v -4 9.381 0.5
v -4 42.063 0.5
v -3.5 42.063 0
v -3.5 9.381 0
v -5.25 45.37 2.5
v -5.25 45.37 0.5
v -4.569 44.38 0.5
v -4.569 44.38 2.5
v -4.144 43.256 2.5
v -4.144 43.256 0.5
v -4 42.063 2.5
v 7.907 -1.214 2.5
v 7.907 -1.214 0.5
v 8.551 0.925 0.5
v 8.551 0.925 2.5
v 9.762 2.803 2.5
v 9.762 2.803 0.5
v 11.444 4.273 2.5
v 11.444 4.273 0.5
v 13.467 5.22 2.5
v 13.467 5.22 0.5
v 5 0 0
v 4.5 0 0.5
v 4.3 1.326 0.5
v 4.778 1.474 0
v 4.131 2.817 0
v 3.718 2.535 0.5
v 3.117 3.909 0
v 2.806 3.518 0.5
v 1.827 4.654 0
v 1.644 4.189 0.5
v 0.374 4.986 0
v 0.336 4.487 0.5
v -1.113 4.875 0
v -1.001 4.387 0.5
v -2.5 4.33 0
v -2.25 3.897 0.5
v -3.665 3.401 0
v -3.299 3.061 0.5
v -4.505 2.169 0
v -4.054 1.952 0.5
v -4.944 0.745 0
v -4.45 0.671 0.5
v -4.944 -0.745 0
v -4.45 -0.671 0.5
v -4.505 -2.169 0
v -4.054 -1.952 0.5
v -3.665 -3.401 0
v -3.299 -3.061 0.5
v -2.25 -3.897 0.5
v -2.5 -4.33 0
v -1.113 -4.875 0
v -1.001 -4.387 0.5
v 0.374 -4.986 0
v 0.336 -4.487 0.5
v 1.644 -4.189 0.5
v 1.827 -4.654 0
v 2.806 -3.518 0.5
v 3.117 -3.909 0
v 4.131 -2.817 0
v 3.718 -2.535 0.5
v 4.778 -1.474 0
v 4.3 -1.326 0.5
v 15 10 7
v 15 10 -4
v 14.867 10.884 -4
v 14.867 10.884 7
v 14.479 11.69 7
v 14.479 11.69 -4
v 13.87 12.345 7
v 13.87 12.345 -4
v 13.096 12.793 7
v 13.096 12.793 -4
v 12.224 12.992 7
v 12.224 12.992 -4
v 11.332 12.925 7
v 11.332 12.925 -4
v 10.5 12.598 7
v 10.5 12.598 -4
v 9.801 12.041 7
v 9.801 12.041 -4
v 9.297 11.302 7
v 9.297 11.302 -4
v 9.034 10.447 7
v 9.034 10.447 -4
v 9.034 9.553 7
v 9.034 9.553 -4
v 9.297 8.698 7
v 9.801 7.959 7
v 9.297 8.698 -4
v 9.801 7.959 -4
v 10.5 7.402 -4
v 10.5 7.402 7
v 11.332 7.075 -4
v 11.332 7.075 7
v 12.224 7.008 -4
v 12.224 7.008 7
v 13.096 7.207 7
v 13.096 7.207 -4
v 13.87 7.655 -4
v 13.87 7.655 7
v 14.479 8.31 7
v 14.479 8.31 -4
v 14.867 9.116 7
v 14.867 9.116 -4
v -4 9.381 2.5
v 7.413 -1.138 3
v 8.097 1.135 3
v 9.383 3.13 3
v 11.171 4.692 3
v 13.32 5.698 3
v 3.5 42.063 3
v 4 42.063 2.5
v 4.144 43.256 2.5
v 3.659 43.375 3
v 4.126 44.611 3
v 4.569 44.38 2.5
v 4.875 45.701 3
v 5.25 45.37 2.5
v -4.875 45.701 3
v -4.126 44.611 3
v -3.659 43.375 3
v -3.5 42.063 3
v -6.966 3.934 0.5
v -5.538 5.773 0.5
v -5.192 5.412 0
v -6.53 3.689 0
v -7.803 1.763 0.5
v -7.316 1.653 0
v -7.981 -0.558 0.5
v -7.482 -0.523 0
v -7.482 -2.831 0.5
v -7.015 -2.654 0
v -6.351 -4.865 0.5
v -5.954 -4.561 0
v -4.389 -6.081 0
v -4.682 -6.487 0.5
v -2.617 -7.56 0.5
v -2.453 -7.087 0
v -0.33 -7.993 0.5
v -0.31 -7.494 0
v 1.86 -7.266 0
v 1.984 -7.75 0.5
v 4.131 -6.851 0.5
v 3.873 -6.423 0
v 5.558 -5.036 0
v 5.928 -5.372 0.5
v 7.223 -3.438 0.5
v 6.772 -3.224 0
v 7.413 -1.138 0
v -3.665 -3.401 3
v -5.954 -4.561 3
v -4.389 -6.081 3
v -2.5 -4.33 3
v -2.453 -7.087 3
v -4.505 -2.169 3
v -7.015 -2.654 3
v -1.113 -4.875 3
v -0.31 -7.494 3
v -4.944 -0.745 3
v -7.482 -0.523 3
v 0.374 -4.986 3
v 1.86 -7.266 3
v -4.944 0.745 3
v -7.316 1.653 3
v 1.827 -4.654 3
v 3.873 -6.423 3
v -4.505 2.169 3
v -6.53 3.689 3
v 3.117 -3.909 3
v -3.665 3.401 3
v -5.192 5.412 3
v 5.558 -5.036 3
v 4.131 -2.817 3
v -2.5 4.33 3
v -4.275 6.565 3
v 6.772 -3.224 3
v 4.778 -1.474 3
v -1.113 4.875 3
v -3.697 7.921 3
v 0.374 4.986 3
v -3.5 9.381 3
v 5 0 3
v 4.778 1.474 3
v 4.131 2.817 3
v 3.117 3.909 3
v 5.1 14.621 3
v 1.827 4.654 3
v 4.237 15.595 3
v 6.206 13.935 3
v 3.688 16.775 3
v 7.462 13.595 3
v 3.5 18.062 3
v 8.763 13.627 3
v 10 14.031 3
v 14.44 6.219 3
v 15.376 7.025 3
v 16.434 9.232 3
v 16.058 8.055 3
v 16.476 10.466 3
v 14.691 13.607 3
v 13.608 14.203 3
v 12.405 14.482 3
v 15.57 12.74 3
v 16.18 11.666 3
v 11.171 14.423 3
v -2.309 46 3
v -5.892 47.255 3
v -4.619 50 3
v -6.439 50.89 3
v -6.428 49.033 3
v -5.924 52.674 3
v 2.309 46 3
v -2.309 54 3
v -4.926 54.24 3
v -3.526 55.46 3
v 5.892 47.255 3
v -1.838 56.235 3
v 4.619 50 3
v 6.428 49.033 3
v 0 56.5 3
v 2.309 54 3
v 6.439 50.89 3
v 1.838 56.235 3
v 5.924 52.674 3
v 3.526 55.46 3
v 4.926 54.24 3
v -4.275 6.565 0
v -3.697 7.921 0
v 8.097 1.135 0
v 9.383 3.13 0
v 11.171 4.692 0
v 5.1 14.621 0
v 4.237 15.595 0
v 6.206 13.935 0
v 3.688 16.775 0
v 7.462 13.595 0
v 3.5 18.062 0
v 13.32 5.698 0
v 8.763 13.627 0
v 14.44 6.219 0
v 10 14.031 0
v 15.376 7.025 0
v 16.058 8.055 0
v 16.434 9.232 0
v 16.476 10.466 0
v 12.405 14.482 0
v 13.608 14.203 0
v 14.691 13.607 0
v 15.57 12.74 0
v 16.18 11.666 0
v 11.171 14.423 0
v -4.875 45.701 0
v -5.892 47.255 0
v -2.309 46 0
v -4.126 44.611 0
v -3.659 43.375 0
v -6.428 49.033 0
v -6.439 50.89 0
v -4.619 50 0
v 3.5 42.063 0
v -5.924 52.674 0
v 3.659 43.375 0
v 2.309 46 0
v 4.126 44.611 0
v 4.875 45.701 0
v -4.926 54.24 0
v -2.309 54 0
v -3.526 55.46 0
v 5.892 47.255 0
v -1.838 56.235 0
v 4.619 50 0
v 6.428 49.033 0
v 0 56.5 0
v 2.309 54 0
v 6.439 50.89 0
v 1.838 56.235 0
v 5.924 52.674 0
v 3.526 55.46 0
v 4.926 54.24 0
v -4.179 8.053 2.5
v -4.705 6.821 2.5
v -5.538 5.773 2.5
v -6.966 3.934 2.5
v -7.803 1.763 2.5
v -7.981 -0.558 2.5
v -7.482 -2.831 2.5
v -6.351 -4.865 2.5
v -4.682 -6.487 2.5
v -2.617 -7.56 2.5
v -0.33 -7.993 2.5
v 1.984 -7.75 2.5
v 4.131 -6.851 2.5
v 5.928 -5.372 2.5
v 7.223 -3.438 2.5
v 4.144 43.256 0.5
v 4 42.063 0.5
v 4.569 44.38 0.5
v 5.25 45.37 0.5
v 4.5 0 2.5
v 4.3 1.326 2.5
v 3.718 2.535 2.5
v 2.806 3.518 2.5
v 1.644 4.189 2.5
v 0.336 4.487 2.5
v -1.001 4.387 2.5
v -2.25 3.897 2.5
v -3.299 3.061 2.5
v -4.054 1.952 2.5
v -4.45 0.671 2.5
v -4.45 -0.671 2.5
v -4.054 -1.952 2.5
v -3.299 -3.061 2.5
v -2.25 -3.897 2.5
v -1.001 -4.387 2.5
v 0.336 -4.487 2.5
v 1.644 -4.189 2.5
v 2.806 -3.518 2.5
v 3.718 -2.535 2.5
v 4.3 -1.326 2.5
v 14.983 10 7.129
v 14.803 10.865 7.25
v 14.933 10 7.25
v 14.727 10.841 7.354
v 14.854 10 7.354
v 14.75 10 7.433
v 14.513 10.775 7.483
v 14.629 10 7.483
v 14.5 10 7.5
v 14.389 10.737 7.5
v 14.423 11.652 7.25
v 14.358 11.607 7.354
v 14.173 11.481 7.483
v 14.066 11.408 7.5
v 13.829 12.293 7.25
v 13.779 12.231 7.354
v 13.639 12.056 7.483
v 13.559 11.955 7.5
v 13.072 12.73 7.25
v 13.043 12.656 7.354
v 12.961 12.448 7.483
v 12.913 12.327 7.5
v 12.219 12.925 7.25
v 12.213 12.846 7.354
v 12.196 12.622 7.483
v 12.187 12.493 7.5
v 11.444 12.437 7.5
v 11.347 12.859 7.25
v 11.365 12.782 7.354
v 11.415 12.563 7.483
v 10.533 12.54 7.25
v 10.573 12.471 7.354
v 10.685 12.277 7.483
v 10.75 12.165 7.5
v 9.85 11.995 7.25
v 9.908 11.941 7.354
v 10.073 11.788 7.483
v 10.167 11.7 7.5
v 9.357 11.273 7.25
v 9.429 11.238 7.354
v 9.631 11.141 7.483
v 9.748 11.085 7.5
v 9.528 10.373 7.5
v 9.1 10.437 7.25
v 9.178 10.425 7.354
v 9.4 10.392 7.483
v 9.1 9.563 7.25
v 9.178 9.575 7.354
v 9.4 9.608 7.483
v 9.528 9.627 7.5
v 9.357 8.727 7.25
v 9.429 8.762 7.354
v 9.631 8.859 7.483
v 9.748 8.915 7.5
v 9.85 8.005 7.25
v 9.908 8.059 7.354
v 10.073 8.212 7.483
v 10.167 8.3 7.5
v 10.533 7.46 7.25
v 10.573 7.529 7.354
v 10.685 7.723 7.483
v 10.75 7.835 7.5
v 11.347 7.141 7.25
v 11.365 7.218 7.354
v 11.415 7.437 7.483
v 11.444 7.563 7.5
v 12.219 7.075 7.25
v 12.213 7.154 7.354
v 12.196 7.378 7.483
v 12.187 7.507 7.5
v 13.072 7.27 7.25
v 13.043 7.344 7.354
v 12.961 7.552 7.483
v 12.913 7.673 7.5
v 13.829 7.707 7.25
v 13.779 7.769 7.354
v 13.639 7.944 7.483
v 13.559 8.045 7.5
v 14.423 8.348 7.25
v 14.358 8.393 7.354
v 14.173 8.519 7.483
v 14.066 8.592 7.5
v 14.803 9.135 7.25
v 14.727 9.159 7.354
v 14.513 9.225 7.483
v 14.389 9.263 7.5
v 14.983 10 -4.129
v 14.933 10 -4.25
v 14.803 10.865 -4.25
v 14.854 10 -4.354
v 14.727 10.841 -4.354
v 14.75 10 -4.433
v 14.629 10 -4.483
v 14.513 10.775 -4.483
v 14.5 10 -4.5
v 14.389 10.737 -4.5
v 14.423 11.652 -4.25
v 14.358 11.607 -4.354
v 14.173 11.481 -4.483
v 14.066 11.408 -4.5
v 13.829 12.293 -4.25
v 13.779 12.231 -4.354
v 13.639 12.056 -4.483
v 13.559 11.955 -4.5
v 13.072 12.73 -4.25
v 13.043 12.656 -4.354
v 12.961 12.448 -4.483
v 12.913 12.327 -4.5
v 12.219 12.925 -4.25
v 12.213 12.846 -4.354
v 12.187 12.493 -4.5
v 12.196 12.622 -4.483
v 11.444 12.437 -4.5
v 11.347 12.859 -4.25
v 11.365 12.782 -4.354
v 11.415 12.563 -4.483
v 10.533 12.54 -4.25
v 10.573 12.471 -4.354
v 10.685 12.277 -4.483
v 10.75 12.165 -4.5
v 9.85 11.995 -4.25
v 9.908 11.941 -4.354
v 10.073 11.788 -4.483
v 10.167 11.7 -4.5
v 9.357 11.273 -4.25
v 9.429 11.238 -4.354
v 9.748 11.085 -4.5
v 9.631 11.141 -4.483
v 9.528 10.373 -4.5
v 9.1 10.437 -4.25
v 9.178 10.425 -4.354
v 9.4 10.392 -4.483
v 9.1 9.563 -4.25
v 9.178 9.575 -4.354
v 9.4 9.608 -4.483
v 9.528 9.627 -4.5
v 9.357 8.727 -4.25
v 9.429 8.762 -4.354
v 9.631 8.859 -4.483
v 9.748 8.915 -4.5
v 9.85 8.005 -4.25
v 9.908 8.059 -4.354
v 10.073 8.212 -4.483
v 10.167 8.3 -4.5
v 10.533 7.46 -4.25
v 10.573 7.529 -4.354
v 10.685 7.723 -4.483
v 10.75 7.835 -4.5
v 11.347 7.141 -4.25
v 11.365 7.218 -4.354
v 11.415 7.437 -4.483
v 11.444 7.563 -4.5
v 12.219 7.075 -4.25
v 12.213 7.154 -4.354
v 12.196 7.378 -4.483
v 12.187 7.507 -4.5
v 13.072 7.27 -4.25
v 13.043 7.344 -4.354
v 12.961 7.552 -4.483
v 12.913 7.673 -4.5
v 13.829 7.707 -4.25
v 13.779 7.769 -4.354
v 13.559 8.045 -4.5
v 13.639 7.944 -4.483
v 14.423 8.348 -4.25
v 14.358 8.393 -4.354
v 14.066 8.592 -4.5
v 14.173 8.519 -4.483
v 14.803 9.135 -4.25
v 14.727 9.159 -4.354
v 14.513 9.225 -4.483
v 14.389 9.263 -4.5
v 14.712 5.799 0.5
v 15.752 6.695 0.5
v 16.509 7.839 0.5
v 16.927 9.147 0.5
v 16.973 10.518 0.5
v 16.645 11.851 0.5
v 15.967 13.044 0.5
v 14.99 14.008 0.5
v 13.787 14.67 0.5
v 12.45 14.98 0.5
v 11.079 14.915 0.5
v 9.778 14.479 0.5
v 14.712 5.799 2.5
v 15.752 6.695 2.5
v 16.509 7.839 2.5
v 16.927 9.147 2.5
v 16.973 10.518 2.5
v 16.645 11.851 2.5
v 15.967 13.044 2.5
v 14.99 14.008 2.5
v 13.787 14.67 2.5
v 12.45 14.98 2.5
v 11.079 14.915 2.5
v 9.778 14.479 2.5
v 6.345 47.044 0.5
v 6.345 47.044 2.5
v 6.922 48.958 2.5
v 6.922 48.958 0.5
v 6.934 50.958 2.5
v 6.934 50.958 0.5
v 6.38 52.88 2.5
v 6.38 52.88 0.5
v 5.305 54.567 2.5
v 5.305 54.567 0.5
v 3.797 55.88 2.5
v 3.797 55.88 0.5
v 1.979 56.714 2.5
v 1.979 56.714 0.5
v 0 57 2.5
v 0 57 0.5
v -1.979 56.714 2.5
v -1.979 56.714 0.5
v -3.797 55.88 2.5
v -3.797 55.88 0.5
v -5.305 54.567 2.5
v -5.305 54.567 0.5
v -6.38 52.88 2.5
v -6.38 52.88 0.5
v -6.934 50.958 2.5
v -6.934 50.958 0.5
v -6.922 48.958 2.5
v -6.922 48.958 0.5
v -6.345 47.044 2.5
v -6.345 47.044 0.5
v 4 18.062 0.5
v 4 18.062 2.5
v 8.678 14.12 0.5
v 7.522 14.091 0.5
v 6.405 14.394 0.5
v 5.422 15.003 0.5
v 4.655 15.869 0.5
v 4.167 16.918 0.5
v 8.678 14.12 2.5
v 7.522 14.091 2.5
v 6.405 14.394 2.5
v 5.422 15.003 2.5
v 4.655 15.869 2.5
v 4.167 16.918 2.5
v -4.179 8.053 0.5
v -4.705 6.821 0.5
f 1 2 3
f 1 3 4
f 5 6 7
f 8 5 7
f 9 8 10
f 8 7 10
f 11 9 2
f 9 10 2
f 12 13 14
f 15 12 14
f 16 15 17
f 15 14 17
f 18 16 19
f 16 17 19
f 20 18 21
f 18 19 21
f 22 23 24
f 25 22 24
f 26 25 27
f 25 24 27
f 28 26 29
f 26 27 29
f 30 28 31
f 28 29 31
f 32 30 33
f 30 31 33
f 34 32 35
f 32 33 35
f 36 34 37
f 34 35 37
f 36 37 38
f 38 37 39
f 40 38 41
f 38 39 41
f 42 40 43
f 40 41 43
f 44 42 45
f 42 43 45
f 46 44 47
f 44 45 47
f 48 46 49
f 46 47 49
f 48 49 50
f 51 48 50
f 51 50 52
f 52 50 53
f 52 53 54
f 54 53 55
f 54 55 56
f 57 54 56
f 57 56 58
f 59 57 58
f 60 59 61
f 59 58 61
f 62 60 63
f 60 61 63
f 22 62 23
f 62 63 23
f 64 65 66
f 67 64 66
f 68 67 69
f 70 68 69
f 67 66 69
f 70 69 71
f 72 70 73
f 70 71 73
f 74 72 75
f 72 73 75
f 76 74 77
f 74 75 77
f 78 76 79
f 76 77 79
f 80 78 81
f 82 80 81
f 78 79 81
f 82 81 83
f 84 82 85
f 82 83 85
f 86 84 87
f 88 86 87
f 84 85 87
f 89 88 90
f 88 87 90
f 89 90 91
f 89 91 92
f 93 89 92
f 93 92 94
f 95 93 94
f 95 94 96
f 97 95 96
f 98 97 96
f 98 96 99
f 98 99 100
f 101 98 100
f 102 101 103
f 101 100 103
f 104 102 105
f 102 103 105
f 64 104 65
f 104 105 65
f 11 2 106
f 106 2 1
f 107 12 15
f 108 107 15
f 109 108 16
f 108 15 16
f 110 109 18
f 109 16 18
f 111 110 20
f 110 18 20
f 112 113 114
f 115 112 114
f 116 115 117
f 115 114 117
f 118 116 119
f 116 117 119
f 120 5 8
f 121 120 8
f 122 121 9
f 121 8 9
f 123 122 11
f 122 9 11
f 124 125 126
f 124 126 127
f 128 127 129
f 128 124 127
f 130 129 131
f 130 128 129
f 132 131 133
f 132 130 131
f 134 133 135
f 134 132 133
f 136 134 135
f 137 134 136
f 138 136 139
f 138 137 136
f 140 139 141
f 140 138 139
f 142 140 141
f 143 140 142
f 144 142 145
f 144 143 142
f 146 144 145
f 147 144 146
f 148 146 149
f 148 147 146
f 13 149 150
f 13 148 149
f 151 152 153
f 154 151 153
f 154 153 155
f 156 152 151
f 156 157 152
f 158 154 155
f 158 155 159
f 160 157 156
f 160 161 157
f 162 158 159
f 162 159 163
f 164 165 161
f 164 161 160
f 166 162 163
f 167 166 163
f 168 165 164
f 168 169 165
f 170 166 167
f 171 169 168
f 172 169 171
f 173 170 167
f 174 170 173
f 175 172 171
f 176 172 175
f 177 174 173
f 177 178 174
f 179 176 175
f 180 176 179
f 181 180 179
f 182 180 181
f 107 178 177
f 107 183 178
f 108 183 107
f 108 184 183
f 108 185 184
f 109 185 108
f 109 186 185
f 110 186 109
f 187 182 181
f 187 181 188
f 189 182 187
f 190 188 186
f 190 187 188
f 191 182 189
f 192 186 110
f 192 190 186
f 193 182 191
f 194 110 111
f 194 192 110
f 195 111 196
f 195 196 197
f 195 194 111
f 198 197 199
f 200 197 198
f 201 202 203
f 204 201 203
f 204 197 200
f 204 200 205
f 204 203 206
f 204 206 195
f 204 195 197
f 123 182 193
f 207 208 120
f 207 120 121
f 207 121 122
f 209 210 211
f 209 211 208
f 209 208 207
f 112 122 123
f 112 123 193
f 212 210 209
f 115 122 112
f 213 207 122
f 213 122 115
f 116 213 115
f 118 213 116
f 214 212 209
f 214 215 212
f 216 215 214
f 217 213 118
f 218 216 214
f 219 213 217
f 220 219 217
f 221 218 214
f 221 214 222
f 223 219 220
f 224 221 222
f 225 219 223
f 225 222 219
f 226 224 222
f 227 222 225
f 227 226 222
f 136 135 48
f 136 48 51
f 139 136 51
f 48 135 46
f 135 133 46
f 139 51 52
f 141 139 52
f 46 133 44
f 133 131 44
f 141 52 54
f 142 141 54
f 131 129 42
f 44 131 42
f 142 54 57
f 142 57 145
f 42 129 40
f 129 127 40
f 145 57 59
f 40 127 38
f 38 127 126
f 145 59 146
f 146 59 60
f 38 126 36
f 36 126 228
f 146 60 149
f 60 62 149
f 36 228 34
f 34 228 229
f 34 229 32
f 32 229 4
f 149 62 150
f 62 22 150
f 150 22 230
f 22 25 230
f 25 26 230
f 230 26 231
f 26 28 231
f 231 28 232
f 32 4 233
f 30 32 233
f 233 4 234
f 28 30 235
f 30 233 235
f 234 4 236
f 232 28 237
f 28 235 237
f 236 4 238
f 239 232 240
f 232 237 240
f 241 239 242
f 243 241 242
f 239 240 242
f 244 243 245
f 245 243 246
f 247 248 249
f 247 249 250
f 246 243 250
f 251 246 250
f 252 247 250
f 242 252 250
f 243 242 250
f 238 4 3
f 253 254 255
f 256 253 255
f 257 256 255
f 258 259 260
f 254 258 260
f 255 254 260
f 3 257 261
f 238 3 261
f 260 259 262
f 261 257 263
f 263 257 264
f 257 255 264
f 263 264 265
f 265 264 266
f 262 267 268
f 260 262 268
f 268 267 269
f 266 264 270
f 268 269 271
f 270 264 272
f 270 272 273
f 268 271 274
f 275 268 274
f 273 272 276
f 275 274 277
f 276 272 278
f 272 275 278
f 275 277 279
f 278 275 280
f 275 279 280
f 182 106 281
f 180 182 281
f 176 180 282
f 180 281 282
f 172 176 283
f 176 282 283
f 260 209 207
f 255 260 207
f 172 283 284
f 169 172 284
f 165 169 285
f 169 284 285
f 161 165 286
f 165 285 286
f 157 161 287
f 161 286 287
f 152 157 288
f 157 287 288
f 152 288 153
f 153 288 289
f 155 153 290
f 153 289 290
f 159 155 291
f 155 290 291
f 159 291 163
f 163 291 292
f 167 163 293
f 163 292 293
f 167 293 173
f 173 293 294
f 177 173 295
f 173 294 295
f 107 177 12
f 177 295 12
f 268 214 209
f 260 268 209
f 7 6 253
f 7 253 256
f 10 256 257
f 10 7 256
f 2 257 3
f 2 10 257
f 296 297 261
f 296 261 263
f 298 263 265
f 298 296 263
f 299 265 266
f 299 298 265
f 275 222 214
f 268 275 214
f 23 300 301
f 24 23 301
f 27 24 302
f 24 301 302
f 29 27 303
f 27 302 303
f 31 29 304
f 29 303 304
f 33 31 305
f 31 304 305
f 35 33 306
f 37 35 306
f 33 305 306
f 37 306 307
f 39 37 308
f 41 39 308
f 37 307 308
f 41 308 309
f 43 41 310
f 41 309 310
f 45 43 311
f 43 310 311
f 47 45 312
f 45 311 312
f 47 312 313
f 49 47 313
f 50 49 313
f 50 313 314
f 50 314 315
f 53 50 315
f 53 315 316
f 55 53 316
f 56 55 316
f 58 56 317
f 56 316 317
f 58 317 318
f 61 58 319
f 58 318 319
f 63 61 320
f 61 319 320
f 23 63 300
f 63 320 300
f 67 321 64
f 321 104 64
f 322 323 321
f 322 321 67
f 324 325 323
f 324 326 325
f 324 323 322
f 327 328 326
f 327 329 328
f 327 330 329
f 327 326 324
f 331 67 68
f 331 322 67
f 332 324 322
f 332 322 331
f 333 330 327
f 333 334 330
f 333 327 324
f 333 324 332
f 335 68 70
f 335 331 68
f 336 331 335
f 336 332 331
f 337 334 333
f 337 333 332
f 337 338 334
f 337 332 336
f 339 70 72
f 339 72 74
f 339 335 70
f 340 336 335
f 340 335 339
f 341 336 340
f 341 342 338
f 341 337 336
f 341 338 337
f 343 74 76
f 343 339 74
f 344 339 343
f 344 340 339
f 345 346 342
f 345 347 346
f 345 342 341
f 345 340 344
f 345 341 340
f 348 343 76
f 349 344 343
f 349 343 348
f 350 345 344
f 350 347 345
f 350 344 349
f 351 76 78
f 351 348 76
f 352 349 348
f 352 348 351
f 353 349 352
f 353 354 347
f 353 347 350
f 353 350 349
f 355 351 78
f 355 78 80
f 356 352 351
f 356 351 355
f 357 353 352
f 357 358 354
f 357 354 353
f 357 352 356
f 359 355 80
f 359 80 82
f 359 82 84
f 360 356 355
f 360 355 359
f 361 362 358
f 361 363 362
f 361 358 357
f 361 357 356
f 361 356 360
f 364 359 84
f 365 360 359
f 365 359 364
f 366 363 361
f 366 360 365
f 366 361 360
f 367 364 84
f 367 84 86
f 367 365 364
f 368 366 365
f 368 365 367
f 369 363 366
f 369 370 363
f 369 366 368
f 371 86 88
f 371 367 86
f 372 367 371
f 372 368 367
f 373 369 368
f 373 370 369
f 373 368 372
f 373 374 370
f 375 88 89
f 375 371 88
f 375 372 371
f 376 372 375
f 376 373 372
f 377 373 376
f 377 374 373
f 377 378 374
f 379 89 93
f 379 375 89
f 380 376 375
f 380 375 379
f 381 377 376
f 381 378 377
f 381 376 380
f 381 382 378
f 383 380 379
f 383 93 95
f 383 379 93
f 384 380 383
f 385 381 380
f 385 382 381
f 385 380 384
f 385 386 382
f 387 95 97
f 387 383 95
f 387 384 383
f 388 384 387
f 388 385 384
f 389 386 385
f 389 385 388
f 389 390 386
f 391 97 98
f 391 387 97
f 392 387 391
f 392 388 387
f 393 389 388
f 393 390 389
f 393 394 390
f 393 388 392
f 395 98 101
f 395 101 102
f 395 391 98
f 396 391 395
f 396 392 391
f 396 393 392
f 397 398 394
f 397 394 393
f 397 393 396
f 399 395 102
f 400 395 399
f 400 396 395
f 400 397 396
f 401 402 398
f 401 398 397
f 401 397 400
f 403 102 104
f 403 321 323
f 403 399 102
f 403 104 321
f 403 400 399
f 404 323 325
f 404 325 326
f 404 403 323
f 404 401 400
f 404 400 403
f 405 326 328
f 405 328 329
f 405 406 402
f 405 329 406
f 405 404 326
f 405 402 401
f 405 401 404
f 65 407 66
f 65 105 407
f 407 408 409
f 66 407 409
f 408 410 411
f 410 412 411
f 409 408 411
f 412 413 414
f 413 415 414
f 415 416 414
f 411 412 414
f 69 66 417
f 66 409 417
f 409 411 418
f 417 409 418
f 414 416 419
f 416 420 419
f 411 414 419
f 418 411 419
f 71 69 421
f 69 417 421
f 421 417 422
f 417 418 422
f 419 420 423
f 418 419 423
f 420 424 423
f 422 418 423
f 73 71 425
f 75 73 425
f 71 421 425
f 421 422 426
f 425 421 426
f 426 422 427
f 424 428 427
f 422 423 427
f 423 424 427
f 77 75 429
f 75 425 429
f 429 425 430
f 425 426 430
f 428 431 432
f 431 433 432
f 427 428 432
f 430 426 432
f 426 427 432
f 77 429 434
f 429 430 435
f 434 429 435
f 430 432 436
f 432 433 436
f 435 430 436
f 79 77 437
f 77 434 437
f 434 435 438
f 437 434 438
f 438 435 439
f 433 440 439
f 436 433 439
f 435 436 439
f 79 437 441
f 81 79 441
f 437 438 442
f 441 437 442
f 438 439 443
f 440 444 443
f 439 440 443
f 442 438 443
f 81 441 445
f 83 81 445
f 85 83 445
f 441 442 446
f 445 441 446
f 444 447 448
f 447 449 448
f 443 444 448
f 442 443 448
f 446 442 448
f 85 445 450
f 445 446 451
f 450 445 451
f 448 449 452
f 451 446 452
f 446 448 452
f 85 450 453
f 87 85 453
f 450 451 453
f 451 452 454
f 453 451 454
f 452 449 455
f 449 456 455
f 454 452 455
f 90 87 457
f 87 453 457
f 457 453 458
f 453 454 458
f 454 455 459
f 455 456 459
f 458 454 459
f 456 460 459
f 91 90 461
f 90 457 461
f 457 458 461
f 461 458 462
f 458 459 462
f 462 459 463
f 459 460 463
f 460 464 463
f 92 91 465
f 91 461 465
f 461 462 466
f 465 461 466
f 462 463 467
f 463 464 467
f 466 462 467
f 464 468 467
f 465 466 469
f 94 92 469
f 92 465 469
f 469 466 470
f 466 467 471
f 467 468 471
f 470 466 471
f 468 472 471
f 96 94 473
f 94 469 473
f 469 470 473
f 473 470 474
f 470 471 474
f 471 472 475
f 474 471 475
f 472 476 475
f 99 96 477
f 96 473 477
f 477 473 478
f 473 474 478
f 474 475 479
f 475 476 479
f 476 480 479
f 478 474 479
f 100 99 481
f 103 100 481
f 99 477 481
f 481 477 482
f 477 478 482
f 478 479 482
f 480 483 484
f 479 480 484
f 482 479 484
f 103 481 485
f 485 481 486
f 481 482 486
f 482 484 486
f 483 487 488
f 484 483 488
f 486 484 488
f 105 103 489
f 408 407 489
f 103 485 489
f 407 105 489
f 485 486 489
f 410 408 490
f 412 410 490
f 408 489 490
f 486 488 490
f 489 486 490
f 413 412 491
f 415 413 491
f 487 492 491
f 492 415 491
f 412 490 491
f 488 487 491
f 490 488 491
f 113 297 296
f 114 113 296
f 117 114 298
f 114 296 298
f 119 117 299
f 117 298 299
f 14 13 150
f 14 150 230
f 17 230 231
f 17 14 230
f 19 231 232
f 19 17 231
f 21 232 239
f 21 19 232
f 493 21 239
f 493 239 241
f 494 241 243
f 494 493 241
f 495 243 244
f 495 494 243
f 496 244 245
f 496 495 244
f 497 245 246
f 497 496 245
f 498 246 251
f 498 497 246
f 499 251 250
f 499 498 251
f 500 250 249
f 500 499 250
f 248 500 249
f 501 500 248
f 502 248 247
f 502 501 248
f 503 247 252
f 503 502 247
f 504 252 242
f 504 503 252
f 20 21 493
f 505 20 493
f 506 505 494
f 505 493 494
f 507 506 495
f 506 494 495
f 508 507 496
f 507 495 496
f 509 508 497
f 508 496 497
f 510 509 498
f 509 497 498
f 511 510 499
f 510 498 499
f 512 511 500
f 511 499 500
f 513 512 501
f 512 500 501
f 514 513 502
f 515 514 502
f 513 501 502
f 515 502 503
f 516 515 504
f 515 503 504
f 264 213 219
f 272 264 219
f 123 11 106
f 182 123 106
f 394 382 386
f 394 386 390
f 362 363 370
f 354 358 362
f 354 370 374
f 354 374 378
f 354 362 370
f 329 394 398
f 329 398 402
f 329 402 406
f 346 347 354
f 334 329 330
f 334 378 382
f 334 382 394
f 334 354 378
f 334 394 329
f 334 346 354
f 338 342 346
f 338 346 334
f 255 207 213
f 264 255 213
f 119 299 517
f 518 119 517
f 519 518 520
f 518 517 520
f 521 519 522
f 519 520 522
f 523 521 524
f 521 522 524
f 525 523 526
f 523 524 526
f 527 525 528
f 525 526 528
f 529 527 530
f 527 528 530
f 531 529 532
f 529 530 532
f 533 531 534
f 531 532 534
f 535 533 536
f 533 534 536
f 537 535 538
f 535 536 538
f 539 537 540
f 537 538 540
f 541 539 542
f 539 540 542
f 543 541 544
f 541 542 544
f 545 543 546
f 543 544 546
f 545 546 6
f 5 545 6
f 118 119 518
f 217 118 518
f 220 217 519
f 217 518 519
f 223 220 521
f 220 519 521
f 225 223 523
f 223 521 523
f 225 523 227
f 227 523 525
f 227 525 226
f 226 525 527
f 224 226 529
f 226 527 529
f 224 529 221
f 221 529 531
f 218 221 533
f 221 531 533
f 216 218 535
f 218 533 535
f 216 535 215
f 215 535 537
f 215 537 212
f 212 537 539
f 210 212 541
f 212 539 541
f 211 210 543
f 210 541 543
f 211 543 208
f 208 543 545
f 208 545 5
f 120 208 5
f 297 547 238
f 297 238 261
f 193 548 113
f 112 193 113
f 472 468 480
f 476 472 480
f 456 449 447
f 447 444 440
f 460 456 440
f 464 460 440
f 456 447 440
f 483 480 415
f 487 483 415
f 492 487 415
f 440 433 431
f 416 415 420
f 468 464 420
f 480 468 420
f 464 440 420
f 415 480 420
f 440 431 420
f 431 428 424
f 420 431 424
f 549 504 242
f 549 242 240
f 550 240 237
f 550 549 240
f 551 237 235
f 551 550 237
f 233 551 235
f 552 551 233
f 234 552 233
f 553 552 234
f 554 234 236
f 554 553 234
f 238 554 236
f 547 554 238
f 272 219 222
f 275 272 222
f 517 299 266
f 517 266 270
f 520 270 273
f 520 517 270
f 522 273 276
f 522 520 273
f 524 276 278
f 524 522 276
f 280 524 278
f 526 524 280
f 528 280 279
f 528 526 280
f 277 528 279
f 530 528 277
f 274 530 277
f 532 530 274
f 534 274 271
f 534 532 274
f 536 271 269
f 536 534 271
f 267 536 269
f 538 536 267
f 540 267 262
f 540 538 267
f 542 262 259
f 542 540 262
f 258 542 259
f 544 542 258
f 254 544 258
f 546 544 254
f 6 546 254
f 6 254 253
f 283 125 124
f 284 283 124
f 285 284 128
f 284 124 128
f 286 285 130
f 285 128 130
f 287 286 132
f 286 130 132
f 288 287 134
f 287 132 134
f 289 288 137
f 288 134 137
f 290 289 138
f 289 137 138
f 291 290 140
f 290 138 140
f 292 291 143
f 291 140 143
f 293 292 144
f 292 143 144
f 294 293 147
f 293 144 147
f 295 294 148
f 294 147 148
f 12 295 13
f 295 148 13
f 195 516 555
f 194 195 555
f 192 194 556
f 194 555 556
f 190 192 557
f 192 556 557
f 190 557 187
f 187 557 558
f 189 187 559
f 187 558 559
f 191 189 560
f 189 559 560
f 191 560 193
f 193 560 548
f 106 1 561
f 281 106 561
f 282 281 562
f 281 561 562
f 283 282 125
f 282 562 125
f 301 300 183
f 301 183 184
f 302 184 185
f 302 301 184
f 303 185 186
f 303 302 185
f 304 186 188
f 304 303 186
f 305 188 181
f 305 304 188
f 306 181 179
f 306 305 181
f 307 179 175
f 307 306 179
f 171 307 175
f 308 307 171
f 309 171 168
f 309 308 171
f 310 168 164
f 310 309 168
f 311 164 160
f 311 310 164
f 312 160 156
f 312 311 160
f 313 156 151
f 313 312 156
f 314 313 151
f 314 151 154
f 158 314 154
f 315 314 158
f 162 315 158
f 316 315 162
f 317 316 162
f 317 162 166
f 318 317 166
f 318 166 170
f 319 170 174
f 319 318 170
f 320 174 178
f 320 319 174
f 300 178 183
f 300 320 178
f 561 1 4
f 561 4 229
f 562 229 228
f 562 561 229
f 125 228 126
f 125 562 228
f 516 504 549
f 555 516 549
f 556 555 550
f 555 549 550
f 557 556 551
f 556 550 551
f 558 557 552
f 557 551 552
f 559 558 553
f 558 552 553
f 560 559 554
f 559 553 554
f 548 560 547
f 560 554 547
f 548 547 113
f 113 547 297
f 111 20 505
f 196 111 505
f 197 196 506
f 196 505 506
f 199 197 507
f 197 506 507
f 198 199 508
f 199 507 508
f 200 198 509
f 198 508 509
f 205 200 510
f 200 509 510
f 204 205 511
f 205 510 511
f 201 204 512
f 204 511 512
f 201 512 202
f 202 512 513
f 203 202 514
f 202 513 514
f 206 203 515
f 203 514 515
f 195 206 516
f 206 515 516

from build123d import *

# Parameters (mm, degrees)
BOSS_EXTRUDE1_DEPTH      = 3
SKETCH2_R                = 4.5
CUT_EXTRUDE1_DEPTH       = 3
BOSS_EXTRUDE4_DEPTH      = 4.5
BOSS_EXTRUDE4_DEPTH_BACK = 7.5
SKETCH2_5_R              = 3
CHAMFER1_SIZE            = 0.5
FILLET1_R                = 0.5


with BuildPart() as part:
    # Sketch1 → Boss-Extrude1 (new body)
    with BuildSketch(Plane.XY):
        with BuildLine():
            Line((-4, 42.062746067), (-4, 9.38083152))
            ThreePointArc((-4, 9.38083152), (-4.400668945, 7.419670168), (-5.538461538, 5.772819397))
            ThreePointArc((-5.538461538, 5.772819397), (-3.688674808, -7.098850481), (7.907374401, -1.213849282))
            ThreePointArc((7.907374401, -1.213849282), (9.761668365, 2.803000933), (13.467211078, 5.220115937))
            ThreePointArc((13.467211078, 5.220115937), (16.64482427, 11.850839674), (9.777777778, 14.479032082))
            ThreePointArc((9.777777778, 14.479032082), (5.891814893, 14.662911406), (4, 18.062257748))
            Line((4, 18.062257748), (4, 42.062746067))
            ThreePointArc((4, 42.062746067), (4.322928267, 43.83051302), (5.25, 45.369935206))
            ThreePointArc((5.25, 45.369935206), (0, 57), (-5.25, 45.369935206))
            ThreePointArc((-5.25, 45.369935206), (-4.322928267, 43.83051302), (-4, 42.062746067))
        make_face()
    extrude(amount=BOSS_EXTRUDE1_DEPTH)

    # Sketch2 → Cut-Extrude1 (cut)
    with BuildSketch(Plane.XY.offset(3)):
        Circle(SKETCH2_R)
        Polygon((4.618802154, 50), (2.309401077, 54), (-2.309401077, 54), (-4.618802154, 50), (-2.309401077, 46), (2.309401077, 46), align=None)
    extrude(amount=-CUT_EXTRUDE1_DEPTH, mode=Mode.SUBTRACT)

    # Chamfer1
    chamfer1_edges = [part.edges().sort_by_distance(p)[0] for p in [
        (9.761668365, 2.803000933, 3),
        (0, 57, 0),
        (4.322928267, 43.83051302, 0),
        (4, 30.062501908, 0),
        (5.891814893, 14.662911406, 0),
        (16.64482427, 11.850839674, 0),
        (9.761668365, 2.803000933, 0),
        (-3.688674808, -7.098850481, 0),
        (-4.400668945, 7.419670168, 0),
        (16.64482427, 11.850839674, 3),
        (5.891814893, 14.662911406, 3),
        (4, 30.062501908, 3),
        (4.322928267, 43.83051302, 3),
        (0, 57, 3),
        (-4.322928267, 43.83051302, 3),
        (-4, 25.721788793, 3),
        (-4.400668945, 7.419670168, 3),
        (-4.5, 0, 0),
        (-4.5, 0, 3),
        (-3.688674808, -7.098850481, 3),
        (-4, 25.721788793, 0),
        (-4.322928267, 43.83051302, 0),
    ]]
    chamfer(chamfer1_edges, length=CHAMFER1_SIZE)


with BuildPart() as body_2:
    # Sketch2<5> → Boss-Extrude4 (new, two sides: drawn at the far end of the back side and taken through both)
    with BuildSketch(Plane.XY.offset(3).offset(-BOSS_EXTRUDE4_DEPTH_BACK)):
        with Locations((12, 10)):
            Circle(SKETCH2_5_R)
    extrude(amount=BOSS_EXTRUDE4_DEPTH + BOSS_EXTRUDE4_DEPTH_BACK)

    # Fillet1
    fillet1_edges = [body_2.edges().sort_by_distance(p)[0] for p in [
        (9, 10, -4.5),
        (9, 10, 7.5),
    ]]
    fillet(fillet1_edges, radius=FILLET1_R)


solid = Compound([part.part, body_2.part])
